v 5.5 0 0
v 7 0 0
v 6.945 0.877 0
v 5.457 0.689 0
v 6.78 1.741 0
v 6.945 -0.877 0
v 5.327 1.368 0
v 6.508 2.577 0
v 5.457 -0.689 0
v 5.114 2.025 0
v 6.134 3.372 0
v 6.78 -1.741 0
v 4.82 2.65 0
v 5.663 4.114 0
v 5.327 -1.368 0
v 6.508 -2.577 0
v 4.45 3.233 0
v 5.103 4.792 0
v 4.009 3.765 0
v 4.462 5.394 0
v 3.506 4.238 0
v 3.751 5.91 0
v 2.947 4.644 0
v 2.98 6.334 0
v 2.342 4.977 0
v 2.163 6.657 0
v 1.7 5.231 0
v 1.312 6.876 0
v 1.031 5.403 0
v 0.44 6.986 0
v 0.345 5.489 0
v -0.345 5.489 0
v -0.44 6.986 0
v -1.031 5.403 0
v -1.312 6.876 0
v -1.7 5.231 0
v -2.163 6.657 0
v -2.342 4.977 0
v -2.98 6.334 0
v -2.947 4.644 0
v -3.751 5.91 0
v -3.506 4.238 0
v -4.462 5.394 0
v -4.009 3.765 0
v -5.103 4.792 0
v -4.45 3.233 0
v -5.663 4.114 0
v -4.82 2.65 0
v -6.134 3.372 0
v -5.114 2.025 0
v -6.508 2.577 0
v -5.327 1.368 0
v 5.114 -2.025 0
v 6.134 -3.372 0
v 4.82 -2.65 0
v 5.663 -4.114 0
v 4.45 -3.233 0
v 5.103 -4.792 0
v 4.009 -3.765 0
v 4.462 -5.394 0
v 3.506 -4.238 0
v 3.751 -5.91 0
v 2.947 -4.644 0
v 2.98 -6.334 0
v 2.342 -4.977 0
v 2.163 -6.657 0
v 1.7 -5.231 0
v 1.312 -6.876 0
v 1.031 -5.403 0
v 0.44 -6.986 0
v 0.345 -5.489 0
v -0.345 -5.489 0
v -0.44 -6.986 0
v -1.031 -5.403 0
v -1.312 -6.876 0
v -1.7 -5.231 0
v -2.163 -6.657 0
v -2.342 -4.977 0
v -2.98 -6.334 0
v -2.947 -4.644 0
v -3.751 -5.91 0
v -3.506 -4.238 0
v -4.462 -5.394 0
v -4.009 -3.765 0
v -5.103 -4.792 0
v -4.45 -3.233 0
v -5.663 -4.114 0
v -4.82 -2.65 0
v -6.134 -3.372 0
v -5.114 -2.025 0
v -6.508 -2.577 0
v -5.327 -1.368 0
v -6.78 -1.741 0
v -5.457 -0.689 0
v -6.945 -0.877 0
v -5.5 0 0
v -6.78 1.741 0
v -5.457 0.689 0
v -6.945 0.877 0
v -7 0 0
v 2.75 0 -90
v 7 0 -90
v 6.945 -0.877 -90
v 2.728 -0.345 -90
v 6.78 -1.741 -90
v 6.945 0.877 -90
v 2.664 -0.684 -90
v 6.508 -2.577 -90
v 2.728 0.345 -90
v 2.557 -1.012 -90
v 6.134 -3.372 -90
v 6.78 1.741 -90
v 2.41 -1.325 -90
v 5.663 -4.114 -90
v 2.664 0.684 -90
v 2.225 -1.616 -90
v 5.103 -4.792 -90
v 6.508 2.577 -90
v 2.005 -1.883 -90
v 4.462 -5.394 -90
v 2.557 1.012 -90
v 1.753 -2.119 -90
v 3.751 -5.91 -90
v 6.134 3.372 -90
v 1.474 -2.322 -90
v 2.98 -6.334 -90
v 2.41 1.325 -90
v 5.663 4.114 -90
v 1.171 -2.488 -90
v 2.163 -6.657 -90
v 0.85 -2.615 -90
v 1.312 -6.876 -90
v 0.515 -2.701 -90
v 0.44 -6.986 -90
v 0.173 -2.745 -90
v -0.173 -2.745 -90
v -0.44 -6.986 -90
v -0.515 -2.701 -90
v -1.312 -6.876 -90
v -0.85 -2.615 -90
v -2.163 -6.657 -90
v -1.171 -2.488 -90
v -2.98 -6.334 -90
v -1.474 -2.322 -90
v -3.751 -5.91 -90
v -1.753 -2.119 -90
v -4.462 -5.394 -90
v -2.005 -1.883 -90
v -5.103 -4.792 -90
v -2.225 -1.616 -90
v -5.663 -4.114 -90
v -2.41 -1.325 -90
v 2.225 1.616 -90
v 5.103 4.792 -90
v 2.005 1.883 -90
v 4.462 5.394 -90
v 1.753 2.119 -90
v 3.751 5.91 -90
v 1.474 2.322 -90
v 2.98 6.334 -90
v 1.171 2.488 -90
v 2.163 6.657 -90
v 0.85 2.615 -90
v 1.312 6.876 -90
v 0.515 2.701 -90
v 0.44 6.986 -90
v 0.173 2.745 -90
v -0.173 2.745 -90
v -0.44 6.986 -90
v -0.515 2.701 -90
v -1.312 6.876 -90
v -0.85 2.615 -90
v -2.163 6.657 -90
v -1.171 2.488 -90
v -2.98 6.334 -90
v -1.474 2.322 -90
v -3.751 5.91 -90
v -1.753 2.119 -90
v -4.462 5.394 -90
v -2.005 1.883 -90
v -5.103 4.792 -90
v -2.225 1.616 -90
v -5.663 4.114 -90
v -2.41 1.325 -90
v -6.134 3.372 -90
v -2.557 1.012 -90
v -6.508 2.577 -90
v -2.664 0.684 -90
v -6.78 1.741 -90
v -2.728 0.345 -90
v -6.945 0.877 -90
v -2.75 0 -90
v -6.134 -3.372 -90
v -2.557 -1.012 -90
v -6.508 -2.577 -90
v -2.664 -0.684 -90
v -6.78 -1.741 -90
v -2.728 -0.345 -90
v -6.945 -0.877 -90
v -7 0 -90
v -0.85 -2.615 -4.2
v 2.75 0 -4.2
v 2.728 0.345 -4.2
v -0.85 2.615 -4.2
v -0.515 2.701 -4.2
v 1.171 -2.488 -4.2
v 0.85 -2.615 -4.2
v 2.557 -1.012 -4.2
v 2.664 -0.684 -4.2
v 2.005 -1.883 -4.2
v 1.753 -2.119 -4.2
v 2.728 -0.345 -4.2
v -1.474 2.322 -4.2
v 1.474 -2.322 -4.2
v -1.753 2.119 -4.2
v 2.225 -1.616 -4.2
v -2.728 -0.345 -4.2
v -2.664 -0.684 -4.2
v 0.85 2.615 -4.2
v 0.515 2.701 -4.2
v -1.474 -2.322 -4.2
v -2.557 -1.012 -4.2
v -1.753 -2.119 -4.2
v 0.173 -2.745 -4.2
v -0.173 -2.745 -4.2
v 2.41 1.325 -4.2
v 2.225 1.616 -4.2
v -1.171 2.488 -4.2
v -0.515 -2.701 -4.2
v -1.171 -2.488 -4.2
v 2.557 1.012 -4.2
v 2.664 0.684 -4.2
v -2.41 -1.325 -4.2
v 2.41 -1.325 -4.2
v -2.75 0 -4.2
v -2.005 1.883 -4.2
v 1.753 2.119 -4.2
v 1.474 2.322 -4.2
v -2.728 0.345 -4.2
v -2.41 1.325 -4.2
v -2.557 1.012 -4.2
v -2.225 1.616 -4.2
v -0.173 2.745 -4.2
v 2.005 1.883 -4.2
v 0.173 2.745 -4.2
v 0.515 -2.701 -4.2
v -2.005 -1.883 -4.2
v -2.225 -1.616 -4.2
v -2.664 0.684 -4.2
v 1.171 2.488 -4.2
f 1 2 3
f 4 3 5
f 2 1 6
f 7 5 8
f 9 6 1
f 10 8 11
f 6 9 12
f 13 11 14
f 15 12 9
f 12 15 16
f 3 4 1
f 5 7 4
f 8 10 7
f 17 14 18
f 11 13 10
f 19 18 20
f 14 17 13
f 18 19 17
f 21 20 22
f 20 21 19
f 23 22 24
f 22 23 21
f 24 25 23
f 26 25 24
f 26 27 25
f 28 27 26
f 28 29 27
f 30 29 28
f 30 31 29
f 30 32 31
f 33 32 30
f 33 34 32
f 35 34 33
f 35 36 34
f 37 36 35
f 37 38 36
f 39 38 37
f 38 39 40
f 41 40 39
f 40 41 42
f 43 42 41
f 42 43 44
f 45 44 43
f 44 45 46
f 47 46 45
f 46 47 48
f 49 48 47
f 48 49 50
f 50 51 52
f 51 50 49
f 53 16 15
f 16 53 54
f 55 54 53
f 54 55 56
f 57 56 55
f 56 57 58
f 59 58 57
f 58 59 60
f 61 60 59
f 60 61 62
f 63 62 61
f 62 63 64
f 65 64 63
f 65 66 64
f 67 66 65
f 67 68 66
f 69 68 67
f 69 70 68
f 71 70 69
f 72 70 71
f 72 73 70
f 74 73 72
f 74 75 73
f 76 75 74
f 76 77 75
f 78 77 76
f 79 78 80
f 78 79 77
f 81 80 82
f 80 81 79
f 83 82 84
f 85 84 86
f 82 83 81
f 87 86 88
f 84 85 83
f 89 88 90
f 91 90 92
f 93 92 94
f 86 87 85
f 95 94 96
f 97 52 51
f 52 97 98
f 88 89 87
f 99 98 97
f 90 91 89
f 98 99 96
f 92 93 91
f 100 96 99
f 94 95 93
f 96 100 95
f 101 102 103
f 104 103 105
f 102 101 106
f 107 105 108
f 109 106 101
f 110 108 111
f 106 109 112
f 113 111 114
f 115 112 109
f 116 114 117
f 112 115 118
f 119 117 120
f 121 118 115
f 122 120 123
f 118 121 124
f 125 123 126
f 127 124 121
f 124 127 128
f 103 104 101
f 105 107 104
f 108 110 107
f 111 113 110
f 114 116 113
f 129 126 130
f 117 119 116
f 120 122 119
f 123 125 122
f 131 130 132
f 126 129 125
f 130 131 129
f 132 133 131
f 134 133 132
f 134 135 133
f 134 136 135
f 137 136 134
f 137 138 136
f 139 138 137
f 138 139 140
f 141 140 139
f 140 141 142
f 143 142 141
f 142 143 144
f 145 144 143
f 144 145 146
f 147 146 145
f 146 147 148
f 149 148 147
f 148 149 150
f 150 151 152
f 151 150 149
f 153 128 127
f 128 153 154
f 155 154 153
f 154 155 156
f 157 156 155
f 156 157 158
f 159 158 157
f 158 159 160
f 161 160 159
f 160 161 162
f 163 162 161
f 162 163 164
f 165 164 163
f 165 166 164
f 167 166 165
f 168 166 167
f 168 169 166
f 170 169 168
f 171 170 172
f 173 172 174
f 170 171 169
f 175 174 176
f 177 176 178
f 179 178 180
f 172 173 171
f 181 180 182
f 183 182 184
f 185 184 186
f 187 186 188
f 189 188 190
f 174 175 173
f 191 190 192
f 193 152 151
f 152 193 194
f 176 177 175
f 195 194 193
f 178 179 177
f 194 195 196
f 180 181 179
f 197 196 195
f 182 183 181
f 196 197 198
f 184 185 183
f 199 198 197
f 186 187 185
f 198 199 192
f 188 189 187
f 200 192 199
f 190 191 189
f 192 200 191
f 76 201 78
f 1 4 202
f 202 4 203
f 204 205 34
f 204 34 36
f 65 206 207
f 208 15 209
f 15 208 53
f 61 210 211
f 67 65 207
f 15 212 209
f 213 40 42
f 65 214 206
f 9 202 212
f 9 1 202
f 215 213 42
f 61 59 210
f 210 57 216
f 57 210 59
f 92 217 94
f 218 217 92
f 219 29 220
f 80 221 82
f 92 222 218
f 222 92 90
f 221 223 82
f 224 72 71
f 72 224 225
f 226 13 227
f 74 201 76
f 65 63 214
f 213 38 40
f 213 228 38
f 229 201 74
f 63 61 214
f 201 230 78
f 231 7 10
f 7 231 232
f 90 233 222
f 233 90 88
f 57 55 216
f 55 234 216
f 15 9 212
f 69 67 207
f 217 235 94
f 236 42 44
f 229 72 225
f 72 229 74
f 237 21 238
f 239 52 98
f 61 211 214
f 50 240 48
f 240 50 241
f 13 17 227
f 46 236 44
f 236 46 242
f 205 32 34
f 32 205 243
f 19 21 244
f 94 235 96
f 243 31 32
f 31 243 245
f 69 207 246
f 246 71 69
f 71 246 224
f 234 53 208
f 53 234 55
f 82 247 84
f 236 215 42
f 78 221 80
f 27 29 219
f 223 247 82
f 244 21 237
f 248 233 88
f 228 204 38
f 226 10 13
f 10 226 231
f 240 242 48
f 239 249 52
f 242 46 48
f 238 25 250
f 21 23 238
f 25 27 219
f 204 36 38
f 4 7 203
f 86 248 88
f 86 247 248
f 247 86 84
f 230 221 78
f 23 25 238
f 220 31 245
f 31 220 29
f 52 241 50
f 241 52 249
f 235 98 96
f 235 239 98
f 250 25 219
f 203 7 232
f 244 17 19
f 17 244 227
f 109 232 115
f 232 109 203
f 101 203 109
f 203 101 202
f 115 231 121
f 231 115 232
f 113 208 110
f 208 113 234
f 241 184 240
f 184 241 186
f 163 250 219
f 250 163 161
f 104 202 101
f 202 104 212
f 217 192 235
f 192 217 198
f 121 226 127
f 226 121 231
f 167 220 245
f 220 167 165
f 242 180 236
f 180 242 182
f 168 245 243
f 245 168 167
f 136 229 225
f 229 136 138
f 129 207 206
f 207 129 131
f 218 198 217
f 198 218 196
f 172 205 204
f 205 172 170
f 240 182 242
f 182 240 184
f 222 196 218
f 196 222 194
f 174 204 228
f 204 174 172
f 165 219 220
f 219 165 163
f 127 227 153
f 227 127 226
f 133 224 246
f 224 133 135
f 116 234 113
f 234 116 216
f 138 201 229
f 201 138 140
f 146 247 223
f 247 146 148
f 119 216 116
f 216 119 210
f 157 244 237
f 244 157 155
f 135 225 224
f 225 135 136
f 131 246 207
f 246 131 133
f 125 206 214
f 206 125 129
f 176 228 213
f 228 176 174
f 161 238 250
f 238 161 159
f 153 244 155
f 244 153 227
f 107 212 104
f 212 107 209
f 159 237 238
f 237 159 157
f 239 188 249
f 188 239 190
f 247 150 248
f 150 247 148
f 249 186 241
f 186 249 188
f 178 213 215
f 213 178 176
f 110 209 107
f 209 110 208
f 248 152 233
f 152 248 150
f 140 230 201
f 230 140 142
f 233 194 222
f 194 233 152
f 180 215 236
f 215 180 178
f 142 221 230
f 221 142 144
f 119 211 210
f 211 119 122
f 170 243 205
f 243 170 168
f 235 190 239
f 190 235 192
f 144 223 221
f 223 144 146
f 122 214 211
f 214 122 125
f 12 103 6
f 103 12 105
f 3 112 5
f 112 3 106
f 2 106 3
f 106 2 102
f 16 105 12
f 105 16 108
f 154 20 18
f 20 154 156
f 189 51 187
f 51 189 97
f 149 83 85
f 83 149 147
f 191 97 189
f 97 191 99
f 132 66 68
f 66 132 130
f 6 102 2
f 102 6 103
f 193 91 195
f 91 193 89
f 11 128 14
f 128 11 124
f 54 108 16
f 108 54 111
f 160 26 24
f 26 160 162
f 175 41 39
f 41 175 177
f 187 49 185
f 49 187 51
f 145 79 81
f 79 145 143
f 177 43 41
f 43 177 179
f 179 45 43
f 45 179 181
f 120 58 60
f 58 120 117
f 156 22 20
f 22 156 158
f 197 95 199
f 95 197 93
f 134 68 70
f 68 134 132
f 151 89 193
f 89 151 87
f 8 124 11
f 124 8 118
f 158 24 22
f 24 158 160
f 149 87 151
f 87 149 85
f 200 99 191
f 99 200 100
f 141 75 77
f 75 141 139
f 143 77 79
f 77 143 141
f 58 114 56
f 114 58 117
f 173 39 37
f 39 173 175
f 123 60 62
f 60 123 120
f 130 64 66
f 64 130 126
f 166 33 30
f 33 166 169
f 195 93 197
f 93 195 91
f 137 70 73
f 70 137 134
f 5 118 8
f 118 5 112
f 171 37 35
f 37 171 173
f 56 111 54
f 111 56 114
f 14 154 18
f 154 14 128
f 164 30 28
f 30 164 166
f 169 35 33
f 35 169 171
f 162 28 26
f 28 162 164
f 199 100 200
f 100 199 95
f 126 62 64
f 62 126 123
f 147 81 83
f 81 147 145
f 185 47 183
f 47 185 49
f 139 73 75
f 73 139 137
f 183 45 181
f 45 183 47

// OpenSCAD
$fn = 50;


difference() {
	union() {
		translate(v = [0, 0, -90.0000000000]) {
			cylinder(h = 90, r = 7.0000000000);
		}
		cylinder(h = 0, r = 10.0000000000);
	}
	union() {
		translate(v = [0, 0, 0]) {
			rotate(a = [0, 0, 0]) {
				difference() {
					union() {
						#translate(v = [0, 0, -90.0000000000]) {
							cylinder(h = 90, r = 2.2500000000);
						}
						#translate(v = [0, 0, -4.2000000000]) {
							cylinder(h = 4.2000000000, r1 = 2.7500000000, r2 = 5.5000000000);
						}
						#translate(v = [0, 0, -90.0000000000]) {
							cylinder(h = 90, r = 2.7500000000);
						}
						#translate(v = [0, 0, -90.0000000000]) {
							cylinder(h = 90, r = 2.2500000000);
						}
					}
					union();
				}
			}
		}
	}
}
